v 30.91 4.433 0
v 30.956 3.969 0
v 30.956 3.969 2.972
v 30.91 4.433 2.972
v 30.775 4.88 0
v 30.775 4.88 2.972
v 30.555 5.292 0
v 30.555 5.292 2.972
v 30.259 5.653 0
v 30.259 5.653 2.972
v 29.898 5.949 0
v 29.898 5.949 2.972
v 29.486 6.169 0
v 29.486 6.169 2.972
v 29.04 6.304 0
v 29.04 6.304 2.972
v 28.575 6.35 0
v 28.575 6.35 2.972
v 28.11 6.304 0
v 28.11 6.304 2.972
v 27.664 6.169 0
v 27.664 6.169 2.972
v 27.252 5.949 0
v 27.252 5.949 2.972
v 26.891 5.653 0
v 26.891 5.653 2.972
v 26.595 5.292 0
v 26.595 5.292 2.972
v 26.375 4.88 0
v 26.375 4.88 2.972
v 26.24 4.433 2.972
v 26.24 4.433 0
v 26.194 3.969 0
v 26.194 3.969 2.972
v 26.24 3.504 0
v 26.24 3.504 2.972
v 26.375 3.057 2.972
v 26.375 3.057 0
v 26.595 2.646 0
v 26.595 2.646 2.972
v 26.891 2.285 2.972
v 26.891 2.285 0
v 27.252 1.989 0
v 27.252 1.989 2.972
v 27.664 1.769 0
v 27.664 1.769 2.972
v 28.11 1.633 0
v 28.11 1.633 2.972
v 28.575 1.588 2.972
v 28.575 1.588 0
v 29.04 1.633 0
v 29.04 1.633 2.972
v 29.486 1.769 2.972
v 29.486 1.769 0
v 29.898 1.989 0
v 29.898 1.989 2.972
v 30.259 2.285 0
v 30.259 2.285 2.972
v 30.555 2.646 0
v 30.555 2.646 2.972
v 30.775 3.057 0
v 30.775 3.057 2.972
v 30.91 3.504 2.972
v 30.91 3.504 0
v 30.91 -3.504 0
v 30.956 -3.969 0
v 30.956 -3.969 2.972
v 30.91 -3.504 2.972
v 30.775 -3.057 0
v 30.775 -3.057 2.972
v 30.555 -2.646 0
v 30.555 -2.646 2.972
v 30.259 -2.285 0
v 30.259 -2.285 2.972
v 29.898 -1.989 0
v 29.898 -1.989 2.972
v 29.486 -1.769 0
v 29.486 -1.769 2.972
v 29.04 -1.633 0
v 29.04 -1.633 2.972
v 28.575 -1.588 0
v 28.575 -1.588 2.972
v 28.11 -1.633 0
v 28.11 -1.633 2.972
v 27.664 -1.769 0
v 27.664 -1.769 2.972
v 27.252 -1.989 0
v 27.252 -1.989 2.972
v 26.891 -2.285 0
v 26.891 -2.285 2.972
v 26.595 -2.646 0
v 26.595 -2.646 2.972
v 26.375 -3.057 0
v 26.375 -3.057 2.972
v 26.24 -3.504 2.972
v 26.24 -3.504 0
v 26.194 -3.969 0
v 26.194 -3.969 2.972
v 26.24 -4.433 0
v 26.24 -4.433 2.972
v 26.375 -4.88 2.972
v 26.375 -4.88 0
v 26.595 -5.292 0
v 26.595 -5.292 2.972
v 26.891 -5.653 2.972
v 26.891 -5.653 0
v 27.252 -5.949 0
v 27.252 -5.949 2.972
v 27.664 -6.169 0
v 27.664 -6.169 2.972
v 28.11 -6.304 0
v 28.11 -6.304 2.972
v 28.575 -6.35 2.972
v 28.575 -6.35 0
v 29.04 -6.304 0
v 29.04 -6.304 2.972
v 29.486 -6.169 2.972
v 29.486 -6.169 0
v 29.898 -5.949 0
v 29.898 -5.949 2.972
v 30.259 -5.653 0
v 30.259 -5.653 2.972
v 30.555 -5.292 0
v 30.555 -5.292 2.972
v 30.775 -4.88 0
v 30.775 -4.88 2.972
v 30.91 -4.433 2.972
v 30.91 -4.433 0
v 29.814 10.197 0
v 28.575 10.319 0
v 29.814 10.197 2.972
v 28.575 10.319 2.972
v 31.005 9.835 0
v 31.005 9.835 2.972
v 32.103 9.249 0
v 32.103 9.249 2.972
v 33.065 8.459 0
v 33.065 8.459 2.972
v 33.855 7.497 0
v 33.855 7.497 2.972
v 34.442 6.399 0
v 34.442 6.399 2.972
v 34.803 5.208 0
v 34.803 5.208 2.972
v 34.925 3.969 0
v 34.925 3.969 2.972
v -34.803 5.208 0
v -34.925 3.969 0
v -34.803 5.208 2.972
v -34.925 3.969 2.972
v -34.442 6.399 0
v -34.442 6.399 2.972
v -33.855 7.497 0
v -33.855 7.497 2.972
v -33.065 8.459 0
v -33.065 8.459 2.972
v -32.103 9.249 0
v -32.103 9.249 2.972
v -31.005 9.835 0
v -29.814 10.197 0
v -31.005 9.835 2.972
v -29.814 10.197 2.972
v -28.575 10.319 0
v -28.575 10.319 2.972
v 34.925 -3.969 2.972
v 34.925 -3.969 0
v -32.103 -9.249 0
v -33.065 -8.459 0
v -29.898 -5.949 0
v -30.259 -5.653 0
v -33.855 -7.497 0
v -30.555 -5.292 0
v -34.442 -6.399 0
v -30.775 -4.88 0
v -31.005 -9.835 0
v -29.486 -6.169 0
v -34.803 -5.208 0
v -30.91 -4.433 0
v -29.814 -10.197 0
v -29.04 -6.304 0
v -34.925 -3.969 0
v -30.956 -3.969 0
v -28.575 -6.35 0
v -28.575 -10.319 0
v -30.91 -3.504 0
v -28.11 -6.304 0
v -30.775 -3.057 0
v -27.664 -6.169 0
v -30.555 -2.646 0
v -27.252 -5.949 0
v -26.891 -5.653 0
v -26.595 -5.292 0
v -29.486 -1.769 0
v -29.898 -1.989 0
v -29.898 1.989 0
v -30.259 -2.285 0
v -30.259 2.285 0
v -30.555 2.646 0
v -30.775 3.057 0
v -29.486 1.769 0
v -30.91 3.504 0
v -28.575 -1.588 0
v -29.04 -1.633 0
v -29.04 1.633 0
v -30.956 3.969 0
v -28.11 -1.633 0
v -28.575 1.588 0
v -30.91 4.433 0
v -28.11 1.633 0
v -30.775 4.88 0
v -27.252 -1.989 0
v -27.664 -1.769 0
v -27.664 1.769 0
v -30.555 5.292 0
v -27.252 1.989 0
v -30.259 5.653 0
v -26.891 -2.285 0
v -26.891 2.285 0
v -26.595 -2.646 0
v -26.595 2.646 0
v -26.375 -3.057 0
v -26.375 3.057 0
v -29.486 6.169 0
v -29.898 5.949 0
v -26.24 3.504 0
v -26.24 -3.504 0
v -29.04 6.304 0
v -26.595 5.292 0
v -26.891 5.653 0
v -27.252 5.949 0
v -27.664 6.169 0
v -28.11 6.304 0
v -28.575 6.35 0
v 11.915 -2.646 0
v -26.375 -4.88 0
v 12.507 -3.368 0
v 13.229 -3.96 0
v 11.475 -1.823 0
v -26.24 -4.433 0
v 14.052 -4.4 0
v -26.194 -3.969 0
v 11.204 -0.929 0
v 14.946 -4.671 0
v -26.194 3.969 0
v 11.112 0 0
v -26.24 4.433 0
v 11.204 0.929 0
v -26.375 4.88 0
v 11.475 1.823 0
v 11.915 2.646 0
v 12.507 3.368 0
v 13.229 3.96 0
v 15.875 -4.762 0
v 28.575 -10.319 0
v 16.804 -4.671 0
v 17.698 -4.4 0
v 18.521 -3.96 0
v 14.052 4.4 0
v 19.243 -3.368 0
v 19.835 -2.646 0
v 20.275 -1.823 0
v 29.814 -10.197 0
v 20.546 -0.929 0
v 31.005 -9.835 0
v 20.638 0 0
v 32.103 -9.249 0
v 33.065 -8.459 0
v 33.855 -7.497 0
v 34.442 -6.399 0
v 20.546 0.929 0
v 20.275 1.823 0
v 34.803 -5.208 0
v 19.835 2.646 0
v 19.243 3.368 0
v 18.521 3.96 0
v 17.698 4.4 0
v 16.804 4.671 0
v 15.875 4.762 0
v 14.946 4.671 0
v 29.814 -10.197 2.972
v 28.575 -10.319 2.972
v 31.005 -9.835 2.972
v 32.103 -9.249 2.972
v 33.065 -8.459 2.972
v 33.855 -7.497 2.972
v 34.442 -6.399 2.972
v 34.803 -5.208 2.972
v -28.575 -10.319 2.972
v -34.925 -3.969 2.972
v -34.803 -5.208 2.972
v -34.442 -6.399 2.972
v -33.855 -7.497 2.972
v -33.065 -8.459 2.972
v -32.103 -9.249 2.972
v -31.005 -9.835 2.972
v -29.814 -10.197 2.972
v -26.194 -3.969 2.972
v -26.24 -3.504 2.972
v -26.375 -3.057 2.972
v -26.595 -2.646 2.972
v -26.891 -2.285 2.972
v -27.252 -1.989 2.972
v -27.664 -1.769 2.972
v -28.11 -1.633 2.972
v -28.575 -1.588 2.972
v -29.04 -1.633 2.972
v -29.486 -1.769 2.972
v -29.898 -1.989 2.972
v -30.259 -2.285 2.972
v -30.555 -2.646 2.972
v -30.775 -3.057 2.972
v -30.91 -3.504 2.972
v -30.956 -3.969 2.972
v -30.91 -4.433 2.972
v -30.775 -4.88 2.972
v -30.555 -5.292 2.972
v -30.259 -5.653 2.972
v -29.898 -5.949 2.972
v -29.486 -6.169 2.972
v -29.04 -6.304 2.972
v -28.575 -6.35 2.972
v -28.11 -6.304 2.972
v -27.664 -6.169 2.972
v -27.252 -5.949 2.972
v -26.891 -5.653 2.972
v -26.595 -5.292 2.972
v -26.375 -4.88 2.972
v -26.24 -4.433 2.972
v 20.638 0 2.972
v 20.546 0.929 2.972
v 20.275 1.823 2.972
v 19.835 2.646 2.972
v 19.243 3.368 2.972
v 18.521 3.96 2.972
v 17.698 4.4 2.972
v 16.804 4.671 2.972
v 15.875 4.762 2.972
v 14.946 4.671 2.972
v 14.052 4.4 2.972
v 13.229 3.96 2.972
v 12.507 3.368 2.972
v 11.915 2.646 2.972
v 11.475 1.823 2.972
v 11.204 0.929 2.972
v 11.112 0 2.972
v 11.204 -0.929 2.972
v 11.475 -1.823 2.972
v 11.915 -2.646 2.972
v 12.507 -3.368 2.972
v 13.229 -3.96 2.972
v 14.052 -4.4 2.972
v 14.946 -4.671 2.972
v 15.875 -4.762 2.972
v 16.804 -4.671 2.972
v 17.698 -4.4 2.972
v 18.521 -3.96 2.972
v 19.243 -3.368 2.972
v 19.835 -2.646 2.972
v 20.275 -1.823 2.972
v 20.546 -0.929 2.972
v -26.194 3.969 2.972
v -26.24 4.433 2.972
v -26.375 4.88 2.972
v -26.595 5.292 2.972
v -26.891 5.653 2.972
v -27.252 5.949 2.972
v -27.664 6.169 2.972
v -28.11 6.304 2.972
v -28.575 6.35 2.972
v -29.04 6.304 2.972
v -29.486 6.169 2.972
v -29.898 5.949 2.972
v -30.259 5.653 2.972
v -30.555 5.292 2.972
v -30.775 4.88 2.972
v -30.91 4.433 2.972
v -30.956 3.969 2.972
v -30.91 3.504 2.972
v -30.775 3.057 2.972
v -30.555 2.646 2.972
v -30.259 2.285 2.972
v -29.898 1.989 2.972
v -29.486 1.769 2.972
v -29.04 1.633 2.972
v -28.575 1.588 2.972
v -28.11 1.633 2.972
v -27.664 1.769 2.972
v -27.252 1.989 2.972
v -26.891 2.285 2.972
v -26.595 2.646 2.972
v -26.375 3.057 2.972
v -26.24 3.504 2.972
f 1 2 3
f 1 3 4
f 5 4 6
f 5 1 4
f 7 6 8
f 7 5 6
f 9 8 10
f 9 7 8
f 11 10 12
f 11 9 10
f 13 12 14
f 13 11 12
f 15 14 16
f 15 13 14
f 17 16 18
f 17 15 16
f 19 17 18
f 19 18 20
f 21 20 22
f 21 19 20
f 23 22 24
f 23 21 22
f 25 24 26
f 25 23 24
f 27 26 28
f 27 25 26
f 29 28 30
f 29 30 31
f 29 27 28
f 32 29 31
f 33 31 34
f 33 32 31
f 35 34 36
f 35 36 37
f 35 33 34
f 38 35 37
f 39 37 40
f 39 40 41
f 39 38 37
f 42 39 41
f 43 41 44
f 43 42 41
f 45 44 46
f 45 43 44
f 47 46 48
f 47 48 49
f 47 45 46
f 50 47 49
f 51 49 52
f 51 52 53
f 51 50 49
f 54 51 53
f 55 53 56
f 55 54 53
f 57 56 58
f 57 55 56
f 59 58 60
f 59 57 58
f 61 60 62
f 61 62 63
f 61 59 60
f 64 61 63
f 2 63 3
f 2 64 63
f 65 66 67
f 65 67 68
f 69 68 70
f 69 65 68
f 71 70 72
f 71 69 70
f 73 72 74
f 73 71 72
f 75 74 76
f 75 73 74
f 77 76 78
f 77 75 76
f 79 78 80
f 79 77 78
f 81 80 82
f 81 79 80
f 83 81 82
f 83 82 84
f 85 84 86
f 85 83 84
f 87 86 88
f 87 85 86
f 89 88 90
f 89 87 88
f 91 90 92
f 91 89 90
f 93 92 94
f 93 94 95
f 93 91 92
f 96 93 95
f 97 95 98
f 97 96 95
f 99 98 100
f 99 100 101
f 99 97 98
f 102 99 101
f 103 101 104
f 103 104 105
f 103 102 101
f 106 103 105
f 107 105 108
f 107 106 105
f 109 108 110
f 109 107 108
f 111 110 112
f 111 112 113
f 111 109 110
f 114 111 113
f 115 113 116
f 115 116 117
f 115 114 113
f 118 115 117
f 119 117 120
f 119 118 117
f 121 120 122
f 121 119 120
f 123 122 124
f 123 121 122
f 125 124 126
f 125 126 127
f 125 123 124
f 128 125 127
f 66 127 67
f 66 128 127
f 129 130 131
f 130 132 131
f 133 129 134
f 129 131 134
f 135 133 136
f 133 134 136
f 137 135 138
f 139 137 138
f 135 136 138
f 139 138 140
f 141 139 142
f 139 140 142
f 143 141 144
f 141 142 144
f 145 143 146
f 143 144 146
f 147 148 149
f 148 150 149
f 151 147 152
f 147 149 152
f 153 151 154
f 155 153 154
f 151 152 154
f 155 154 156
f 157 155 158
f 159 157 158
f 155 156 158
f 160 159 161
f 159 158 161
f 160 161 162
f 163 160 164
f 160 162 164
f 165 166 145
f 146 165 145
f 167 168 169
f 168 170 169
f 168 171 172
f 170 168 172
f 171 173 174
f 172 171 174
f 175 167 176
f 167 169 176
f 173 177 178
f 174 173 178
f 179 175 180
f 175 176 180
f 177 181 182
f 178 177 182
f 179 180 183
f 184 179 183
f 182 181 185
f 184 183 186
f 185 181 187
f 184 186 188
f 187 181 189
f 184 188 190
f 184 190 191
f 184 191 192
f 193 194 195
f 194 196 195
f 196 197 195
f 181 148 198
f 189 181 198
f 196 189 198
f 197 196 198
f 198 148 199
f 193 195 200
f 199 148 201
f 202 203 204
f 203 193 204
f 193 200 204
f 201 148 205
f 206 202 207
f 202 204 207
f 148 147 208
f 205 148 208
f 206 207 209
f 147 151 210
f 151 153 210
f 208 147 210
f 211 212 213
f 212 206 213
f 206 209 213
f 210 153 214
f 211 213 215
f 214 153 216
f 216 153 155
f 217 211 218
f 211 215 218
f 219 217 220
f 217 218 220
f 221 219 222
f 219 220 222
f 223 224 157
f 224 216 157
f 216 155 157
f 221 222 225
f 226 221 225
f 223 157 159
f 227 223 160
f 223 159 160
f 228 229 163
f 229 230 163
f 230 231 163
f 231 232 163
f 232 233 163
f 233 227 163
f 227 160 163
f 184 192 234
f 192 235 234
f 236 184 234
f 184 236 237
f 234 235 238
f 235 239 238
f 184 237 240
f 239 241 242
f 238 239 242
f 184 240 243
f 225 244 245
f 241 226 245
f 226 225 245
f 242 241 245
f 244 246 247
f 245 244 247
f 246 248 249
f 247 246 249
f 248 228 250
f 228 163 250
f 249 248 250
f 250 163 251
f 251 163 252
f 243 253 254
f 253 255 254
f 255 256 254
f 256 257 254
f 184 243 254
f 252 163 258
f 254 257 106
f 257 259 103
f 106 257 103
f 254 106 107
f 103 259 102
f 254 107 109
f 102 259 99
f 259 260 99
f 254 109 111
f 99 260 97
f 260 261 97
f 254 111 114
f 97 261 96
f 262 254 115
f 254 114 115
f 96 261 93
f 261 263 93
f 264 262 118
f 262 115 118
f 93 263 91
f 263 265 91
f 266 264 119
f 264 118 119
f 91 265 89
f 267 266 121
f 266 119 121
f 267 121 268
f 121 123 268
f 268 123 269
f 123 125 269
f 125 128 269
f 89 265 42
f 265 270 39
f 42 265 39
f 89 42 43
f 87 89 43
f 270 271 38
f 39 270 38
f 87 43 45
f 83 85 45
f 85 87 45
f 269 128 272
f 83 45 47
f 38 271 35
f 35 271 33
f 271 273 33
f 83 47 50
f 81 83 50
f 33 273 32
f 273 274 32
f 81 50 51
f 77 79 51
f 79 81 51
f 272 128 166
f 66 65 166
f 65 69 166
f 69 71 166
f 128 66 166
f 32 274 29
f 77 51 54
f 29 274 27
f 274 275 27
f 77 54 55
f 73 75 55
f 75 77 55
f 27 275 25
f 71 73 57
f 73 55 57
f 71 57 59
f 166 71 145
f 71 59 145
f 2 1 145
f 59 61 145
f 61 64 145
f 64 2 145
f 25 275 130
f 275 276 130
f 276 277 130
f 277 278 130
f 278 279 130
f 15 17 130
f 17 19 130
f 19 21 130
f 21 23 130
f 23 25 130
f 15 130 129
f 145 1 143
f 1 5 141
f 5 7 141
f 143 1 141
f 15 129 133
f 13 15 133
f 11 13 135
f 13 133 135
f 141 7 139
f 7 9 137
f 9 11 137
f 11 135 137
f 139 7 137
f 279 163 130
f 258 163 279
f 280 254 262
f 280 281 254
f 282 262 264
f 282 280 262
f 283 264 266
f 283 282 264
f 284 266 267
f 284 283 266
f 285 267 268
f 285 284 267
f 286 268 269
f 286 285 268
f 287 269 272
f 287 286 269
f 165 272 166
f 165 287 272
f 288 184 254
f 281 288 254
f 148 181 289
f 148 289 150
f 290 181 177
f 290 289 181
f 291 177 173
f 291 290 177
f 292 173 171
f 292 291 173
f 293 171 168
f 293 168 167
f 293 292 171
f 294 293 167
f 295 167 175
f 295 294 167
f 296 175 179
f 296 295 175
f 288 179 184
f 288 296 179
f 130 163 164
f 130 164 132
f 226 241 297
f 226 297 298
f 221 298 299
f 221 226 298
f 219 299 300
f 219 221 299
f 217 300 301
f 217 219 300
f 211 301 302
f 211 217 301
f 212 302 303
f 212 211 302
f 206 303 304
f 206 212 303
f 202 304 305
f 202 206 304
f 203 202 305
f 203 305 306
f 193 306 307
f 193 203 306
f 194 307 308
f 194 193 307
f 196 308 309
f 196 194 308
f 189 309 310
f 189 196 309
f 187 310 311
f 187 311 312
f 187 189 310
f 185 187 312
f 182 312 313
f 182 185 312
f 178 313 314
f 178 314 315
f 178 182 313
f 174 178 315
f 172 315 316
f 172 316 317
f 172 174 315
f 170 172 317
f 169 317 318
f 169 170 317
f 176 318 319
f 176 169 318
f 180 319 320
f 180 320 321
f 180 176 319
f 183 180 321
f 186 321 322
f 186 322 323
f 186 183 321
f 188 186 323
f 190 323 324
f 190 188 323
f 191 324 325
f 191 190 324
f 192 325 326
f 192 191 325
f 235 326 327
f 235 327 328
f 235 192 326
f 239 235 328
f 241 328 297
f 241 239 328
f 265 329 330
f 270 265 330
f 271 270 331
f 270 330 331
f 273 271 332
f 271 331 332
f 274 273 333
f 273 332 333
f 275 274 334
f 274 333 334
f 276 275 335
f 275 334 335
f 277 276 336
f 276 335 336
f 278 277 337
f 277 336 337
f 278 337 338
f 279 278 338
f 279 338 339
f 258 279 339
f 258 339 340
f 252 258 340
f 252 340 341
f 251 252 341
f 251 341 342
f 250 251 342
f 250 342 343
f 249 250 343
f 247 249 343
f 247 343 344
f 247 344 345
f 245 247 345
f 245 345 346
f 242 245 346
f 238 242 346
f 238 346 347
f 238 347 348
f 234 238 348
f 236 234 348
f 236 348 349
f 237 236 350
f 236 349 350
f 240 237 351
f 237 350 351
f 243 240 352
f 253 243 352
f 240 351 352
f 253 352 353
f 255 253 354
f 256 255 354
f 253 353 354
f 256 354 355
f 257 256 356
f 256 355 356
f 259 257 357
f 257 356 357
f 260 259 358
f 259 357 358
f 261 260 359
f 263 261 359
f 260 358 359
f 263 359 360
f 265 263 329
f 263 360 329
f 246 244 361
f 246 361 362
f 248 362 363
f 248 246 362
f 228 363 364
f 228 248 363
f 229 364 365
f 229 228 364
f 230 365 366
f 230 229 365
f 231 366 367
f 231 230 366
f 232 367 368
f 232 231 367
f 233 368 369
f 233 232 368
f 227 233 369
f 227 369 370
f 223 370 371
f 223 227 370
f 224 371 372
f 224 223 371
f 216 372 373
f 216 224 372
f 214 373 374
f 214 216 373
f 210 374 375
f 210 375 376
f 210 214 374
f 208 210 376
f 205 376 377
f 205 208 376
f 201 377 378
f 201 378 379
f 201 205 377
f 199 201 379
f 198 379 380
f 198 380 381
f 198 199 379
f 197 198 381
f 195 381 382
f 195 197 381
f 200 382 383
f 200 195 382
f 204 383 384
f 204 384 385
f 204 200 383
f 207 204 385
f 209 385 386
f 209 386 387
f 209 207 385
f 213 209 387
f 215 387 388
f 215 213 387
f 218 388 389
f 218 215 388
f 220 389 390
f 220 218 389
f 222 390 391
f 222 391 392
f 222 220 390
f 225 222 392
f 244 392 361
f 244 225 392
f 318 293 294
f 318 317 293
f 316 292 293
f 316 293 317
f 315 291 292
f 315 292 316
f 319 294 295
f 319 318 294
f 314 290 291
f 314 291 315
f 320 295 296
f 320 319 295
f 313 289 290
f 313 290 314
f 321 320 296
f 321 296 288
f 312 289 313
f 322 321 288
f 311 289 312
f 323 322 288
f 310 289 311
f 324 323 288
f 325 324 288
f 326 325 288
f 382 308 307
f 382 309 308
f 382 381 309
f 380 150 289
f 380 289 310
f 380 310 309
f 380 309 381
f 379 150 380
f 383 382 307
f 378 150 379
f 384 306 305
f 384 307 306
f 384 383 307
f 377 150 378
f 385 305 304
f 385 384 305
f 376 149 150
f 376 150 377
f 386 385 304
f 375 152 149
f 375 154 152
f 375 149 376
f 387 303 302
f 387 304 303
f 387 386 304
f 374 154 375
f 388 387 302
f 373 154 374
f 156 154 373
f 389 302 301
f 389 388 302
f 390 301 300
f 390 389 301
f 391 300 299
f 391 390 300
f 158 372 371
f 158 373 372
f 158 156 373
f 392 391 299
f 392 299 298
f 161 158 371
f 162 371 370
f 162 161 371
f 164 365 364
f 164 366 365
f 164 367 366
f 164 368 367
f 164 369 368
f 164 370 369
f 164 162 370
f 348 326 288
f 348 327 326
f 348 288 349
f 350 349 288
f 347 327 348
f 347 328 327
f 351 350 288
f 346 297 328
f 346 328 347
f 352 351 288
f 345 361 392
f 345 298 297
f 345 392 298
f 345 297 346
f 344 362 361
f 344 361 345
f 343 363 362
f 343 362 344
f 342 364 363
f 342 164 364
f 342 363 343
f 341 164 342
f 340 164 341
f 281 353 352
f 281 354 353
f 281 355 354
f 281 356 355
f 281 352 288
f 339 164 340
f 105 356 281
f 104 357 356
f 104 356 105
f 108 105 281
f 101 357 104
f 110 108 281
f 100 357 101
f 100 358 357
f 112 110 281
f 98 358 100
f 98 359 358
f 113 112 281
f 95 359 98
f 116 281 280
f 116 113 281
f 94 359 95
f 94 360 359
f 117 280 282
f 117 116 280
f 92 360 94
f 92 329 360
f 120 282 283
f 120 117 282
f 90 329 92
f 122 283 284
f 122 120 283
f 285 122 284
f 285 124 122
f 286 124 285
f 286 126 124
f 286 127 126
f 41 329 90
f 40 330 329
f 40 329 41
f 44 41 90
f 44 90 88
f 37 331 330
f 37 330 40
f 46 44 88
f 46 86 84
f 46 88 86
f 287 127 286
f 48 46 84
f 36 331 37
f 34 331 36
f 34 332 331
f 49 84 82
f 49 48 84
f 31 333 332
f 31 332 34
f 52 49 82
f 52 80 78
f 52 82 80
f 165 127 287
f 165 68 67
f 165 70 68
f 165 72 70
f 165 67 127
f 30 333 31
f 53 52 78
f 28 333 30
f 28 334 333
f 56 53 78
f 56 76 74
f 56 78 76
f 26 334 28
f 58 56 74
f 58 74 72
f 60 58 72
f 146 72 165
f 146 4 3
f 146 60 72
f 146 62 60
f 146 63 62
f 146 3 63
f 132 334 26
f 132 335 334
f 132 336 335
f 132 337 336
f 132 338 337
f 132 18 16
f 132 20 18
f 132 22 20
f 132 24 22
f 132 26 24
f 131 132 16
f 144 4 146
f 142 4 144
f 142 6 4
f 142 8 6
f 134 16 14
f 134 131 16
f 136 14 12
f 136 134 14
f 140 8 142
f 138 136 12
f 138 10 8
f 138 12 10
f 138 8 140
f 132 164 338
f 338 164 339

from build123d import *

# Parameters (mm, degrees)
SKETCH1_W           = 69.85
SKETCH1_H           = 20.6375
SKETCH1_R           = 2.38125
BOSS_EXTRUDE1_DEPTH = 2.9718
FILLET1_R           = 6.35
SKETCH2_R           = 4.7625
CUT_EXTRUDE1_DEPTH  = 3.9718


with BuildPart() as part:
    # Sketch1 → Boss-Extrude1 (new body)
    with BuildSketch(Plane.XY):
        Rectangle(SKETCH1_W, SKETCH1_H)
        with Locations((-28.575, 3.96875)):
            Circle(SKETCH1_R, mode=Mode.SUBTRACT)
        with Locations((-28.575, -3.96875)):
            Circle(SKETCH1_R, mode=Mode.SUBTRACT)
        with Locations((28.575, 3.96875)):
            Circle(SKETCH1_R, mode=Mode.SUBTRACT)
        with Locations((28.575, -3.96875)):
            Circle(SKETCH1_R, mode=Mode.SUBTRACT)
    extrude(amount=BOSS_EXTRUDE1_DEPTH)

    # Fillet1
    fillet1_edges = [part.edges().sort_by_distance(p)[0] for p in [
        (-34.925, 10.31875, 1.4859),
        (34.925, 10.31875, 1.4859),
        (34.925, -10.31875, 1.4859),
        (-34.925, -10.31875, 1.4859),
    ]]
    fillet(fillet1_edges, radius=FILLET1_R)

    # Sketch2 → Cut-Extrude1 (cut, through all)
    with BuildSketch(Plane.XY.offset(2.9718)):
        with Locations((15.875, 0)):
            Circle(SKETCH2_R)
    extrude(amount=-CUT_EXTRUDE1_DEPTH, mode=Mode.SUBTRACT)


solid = part.part
